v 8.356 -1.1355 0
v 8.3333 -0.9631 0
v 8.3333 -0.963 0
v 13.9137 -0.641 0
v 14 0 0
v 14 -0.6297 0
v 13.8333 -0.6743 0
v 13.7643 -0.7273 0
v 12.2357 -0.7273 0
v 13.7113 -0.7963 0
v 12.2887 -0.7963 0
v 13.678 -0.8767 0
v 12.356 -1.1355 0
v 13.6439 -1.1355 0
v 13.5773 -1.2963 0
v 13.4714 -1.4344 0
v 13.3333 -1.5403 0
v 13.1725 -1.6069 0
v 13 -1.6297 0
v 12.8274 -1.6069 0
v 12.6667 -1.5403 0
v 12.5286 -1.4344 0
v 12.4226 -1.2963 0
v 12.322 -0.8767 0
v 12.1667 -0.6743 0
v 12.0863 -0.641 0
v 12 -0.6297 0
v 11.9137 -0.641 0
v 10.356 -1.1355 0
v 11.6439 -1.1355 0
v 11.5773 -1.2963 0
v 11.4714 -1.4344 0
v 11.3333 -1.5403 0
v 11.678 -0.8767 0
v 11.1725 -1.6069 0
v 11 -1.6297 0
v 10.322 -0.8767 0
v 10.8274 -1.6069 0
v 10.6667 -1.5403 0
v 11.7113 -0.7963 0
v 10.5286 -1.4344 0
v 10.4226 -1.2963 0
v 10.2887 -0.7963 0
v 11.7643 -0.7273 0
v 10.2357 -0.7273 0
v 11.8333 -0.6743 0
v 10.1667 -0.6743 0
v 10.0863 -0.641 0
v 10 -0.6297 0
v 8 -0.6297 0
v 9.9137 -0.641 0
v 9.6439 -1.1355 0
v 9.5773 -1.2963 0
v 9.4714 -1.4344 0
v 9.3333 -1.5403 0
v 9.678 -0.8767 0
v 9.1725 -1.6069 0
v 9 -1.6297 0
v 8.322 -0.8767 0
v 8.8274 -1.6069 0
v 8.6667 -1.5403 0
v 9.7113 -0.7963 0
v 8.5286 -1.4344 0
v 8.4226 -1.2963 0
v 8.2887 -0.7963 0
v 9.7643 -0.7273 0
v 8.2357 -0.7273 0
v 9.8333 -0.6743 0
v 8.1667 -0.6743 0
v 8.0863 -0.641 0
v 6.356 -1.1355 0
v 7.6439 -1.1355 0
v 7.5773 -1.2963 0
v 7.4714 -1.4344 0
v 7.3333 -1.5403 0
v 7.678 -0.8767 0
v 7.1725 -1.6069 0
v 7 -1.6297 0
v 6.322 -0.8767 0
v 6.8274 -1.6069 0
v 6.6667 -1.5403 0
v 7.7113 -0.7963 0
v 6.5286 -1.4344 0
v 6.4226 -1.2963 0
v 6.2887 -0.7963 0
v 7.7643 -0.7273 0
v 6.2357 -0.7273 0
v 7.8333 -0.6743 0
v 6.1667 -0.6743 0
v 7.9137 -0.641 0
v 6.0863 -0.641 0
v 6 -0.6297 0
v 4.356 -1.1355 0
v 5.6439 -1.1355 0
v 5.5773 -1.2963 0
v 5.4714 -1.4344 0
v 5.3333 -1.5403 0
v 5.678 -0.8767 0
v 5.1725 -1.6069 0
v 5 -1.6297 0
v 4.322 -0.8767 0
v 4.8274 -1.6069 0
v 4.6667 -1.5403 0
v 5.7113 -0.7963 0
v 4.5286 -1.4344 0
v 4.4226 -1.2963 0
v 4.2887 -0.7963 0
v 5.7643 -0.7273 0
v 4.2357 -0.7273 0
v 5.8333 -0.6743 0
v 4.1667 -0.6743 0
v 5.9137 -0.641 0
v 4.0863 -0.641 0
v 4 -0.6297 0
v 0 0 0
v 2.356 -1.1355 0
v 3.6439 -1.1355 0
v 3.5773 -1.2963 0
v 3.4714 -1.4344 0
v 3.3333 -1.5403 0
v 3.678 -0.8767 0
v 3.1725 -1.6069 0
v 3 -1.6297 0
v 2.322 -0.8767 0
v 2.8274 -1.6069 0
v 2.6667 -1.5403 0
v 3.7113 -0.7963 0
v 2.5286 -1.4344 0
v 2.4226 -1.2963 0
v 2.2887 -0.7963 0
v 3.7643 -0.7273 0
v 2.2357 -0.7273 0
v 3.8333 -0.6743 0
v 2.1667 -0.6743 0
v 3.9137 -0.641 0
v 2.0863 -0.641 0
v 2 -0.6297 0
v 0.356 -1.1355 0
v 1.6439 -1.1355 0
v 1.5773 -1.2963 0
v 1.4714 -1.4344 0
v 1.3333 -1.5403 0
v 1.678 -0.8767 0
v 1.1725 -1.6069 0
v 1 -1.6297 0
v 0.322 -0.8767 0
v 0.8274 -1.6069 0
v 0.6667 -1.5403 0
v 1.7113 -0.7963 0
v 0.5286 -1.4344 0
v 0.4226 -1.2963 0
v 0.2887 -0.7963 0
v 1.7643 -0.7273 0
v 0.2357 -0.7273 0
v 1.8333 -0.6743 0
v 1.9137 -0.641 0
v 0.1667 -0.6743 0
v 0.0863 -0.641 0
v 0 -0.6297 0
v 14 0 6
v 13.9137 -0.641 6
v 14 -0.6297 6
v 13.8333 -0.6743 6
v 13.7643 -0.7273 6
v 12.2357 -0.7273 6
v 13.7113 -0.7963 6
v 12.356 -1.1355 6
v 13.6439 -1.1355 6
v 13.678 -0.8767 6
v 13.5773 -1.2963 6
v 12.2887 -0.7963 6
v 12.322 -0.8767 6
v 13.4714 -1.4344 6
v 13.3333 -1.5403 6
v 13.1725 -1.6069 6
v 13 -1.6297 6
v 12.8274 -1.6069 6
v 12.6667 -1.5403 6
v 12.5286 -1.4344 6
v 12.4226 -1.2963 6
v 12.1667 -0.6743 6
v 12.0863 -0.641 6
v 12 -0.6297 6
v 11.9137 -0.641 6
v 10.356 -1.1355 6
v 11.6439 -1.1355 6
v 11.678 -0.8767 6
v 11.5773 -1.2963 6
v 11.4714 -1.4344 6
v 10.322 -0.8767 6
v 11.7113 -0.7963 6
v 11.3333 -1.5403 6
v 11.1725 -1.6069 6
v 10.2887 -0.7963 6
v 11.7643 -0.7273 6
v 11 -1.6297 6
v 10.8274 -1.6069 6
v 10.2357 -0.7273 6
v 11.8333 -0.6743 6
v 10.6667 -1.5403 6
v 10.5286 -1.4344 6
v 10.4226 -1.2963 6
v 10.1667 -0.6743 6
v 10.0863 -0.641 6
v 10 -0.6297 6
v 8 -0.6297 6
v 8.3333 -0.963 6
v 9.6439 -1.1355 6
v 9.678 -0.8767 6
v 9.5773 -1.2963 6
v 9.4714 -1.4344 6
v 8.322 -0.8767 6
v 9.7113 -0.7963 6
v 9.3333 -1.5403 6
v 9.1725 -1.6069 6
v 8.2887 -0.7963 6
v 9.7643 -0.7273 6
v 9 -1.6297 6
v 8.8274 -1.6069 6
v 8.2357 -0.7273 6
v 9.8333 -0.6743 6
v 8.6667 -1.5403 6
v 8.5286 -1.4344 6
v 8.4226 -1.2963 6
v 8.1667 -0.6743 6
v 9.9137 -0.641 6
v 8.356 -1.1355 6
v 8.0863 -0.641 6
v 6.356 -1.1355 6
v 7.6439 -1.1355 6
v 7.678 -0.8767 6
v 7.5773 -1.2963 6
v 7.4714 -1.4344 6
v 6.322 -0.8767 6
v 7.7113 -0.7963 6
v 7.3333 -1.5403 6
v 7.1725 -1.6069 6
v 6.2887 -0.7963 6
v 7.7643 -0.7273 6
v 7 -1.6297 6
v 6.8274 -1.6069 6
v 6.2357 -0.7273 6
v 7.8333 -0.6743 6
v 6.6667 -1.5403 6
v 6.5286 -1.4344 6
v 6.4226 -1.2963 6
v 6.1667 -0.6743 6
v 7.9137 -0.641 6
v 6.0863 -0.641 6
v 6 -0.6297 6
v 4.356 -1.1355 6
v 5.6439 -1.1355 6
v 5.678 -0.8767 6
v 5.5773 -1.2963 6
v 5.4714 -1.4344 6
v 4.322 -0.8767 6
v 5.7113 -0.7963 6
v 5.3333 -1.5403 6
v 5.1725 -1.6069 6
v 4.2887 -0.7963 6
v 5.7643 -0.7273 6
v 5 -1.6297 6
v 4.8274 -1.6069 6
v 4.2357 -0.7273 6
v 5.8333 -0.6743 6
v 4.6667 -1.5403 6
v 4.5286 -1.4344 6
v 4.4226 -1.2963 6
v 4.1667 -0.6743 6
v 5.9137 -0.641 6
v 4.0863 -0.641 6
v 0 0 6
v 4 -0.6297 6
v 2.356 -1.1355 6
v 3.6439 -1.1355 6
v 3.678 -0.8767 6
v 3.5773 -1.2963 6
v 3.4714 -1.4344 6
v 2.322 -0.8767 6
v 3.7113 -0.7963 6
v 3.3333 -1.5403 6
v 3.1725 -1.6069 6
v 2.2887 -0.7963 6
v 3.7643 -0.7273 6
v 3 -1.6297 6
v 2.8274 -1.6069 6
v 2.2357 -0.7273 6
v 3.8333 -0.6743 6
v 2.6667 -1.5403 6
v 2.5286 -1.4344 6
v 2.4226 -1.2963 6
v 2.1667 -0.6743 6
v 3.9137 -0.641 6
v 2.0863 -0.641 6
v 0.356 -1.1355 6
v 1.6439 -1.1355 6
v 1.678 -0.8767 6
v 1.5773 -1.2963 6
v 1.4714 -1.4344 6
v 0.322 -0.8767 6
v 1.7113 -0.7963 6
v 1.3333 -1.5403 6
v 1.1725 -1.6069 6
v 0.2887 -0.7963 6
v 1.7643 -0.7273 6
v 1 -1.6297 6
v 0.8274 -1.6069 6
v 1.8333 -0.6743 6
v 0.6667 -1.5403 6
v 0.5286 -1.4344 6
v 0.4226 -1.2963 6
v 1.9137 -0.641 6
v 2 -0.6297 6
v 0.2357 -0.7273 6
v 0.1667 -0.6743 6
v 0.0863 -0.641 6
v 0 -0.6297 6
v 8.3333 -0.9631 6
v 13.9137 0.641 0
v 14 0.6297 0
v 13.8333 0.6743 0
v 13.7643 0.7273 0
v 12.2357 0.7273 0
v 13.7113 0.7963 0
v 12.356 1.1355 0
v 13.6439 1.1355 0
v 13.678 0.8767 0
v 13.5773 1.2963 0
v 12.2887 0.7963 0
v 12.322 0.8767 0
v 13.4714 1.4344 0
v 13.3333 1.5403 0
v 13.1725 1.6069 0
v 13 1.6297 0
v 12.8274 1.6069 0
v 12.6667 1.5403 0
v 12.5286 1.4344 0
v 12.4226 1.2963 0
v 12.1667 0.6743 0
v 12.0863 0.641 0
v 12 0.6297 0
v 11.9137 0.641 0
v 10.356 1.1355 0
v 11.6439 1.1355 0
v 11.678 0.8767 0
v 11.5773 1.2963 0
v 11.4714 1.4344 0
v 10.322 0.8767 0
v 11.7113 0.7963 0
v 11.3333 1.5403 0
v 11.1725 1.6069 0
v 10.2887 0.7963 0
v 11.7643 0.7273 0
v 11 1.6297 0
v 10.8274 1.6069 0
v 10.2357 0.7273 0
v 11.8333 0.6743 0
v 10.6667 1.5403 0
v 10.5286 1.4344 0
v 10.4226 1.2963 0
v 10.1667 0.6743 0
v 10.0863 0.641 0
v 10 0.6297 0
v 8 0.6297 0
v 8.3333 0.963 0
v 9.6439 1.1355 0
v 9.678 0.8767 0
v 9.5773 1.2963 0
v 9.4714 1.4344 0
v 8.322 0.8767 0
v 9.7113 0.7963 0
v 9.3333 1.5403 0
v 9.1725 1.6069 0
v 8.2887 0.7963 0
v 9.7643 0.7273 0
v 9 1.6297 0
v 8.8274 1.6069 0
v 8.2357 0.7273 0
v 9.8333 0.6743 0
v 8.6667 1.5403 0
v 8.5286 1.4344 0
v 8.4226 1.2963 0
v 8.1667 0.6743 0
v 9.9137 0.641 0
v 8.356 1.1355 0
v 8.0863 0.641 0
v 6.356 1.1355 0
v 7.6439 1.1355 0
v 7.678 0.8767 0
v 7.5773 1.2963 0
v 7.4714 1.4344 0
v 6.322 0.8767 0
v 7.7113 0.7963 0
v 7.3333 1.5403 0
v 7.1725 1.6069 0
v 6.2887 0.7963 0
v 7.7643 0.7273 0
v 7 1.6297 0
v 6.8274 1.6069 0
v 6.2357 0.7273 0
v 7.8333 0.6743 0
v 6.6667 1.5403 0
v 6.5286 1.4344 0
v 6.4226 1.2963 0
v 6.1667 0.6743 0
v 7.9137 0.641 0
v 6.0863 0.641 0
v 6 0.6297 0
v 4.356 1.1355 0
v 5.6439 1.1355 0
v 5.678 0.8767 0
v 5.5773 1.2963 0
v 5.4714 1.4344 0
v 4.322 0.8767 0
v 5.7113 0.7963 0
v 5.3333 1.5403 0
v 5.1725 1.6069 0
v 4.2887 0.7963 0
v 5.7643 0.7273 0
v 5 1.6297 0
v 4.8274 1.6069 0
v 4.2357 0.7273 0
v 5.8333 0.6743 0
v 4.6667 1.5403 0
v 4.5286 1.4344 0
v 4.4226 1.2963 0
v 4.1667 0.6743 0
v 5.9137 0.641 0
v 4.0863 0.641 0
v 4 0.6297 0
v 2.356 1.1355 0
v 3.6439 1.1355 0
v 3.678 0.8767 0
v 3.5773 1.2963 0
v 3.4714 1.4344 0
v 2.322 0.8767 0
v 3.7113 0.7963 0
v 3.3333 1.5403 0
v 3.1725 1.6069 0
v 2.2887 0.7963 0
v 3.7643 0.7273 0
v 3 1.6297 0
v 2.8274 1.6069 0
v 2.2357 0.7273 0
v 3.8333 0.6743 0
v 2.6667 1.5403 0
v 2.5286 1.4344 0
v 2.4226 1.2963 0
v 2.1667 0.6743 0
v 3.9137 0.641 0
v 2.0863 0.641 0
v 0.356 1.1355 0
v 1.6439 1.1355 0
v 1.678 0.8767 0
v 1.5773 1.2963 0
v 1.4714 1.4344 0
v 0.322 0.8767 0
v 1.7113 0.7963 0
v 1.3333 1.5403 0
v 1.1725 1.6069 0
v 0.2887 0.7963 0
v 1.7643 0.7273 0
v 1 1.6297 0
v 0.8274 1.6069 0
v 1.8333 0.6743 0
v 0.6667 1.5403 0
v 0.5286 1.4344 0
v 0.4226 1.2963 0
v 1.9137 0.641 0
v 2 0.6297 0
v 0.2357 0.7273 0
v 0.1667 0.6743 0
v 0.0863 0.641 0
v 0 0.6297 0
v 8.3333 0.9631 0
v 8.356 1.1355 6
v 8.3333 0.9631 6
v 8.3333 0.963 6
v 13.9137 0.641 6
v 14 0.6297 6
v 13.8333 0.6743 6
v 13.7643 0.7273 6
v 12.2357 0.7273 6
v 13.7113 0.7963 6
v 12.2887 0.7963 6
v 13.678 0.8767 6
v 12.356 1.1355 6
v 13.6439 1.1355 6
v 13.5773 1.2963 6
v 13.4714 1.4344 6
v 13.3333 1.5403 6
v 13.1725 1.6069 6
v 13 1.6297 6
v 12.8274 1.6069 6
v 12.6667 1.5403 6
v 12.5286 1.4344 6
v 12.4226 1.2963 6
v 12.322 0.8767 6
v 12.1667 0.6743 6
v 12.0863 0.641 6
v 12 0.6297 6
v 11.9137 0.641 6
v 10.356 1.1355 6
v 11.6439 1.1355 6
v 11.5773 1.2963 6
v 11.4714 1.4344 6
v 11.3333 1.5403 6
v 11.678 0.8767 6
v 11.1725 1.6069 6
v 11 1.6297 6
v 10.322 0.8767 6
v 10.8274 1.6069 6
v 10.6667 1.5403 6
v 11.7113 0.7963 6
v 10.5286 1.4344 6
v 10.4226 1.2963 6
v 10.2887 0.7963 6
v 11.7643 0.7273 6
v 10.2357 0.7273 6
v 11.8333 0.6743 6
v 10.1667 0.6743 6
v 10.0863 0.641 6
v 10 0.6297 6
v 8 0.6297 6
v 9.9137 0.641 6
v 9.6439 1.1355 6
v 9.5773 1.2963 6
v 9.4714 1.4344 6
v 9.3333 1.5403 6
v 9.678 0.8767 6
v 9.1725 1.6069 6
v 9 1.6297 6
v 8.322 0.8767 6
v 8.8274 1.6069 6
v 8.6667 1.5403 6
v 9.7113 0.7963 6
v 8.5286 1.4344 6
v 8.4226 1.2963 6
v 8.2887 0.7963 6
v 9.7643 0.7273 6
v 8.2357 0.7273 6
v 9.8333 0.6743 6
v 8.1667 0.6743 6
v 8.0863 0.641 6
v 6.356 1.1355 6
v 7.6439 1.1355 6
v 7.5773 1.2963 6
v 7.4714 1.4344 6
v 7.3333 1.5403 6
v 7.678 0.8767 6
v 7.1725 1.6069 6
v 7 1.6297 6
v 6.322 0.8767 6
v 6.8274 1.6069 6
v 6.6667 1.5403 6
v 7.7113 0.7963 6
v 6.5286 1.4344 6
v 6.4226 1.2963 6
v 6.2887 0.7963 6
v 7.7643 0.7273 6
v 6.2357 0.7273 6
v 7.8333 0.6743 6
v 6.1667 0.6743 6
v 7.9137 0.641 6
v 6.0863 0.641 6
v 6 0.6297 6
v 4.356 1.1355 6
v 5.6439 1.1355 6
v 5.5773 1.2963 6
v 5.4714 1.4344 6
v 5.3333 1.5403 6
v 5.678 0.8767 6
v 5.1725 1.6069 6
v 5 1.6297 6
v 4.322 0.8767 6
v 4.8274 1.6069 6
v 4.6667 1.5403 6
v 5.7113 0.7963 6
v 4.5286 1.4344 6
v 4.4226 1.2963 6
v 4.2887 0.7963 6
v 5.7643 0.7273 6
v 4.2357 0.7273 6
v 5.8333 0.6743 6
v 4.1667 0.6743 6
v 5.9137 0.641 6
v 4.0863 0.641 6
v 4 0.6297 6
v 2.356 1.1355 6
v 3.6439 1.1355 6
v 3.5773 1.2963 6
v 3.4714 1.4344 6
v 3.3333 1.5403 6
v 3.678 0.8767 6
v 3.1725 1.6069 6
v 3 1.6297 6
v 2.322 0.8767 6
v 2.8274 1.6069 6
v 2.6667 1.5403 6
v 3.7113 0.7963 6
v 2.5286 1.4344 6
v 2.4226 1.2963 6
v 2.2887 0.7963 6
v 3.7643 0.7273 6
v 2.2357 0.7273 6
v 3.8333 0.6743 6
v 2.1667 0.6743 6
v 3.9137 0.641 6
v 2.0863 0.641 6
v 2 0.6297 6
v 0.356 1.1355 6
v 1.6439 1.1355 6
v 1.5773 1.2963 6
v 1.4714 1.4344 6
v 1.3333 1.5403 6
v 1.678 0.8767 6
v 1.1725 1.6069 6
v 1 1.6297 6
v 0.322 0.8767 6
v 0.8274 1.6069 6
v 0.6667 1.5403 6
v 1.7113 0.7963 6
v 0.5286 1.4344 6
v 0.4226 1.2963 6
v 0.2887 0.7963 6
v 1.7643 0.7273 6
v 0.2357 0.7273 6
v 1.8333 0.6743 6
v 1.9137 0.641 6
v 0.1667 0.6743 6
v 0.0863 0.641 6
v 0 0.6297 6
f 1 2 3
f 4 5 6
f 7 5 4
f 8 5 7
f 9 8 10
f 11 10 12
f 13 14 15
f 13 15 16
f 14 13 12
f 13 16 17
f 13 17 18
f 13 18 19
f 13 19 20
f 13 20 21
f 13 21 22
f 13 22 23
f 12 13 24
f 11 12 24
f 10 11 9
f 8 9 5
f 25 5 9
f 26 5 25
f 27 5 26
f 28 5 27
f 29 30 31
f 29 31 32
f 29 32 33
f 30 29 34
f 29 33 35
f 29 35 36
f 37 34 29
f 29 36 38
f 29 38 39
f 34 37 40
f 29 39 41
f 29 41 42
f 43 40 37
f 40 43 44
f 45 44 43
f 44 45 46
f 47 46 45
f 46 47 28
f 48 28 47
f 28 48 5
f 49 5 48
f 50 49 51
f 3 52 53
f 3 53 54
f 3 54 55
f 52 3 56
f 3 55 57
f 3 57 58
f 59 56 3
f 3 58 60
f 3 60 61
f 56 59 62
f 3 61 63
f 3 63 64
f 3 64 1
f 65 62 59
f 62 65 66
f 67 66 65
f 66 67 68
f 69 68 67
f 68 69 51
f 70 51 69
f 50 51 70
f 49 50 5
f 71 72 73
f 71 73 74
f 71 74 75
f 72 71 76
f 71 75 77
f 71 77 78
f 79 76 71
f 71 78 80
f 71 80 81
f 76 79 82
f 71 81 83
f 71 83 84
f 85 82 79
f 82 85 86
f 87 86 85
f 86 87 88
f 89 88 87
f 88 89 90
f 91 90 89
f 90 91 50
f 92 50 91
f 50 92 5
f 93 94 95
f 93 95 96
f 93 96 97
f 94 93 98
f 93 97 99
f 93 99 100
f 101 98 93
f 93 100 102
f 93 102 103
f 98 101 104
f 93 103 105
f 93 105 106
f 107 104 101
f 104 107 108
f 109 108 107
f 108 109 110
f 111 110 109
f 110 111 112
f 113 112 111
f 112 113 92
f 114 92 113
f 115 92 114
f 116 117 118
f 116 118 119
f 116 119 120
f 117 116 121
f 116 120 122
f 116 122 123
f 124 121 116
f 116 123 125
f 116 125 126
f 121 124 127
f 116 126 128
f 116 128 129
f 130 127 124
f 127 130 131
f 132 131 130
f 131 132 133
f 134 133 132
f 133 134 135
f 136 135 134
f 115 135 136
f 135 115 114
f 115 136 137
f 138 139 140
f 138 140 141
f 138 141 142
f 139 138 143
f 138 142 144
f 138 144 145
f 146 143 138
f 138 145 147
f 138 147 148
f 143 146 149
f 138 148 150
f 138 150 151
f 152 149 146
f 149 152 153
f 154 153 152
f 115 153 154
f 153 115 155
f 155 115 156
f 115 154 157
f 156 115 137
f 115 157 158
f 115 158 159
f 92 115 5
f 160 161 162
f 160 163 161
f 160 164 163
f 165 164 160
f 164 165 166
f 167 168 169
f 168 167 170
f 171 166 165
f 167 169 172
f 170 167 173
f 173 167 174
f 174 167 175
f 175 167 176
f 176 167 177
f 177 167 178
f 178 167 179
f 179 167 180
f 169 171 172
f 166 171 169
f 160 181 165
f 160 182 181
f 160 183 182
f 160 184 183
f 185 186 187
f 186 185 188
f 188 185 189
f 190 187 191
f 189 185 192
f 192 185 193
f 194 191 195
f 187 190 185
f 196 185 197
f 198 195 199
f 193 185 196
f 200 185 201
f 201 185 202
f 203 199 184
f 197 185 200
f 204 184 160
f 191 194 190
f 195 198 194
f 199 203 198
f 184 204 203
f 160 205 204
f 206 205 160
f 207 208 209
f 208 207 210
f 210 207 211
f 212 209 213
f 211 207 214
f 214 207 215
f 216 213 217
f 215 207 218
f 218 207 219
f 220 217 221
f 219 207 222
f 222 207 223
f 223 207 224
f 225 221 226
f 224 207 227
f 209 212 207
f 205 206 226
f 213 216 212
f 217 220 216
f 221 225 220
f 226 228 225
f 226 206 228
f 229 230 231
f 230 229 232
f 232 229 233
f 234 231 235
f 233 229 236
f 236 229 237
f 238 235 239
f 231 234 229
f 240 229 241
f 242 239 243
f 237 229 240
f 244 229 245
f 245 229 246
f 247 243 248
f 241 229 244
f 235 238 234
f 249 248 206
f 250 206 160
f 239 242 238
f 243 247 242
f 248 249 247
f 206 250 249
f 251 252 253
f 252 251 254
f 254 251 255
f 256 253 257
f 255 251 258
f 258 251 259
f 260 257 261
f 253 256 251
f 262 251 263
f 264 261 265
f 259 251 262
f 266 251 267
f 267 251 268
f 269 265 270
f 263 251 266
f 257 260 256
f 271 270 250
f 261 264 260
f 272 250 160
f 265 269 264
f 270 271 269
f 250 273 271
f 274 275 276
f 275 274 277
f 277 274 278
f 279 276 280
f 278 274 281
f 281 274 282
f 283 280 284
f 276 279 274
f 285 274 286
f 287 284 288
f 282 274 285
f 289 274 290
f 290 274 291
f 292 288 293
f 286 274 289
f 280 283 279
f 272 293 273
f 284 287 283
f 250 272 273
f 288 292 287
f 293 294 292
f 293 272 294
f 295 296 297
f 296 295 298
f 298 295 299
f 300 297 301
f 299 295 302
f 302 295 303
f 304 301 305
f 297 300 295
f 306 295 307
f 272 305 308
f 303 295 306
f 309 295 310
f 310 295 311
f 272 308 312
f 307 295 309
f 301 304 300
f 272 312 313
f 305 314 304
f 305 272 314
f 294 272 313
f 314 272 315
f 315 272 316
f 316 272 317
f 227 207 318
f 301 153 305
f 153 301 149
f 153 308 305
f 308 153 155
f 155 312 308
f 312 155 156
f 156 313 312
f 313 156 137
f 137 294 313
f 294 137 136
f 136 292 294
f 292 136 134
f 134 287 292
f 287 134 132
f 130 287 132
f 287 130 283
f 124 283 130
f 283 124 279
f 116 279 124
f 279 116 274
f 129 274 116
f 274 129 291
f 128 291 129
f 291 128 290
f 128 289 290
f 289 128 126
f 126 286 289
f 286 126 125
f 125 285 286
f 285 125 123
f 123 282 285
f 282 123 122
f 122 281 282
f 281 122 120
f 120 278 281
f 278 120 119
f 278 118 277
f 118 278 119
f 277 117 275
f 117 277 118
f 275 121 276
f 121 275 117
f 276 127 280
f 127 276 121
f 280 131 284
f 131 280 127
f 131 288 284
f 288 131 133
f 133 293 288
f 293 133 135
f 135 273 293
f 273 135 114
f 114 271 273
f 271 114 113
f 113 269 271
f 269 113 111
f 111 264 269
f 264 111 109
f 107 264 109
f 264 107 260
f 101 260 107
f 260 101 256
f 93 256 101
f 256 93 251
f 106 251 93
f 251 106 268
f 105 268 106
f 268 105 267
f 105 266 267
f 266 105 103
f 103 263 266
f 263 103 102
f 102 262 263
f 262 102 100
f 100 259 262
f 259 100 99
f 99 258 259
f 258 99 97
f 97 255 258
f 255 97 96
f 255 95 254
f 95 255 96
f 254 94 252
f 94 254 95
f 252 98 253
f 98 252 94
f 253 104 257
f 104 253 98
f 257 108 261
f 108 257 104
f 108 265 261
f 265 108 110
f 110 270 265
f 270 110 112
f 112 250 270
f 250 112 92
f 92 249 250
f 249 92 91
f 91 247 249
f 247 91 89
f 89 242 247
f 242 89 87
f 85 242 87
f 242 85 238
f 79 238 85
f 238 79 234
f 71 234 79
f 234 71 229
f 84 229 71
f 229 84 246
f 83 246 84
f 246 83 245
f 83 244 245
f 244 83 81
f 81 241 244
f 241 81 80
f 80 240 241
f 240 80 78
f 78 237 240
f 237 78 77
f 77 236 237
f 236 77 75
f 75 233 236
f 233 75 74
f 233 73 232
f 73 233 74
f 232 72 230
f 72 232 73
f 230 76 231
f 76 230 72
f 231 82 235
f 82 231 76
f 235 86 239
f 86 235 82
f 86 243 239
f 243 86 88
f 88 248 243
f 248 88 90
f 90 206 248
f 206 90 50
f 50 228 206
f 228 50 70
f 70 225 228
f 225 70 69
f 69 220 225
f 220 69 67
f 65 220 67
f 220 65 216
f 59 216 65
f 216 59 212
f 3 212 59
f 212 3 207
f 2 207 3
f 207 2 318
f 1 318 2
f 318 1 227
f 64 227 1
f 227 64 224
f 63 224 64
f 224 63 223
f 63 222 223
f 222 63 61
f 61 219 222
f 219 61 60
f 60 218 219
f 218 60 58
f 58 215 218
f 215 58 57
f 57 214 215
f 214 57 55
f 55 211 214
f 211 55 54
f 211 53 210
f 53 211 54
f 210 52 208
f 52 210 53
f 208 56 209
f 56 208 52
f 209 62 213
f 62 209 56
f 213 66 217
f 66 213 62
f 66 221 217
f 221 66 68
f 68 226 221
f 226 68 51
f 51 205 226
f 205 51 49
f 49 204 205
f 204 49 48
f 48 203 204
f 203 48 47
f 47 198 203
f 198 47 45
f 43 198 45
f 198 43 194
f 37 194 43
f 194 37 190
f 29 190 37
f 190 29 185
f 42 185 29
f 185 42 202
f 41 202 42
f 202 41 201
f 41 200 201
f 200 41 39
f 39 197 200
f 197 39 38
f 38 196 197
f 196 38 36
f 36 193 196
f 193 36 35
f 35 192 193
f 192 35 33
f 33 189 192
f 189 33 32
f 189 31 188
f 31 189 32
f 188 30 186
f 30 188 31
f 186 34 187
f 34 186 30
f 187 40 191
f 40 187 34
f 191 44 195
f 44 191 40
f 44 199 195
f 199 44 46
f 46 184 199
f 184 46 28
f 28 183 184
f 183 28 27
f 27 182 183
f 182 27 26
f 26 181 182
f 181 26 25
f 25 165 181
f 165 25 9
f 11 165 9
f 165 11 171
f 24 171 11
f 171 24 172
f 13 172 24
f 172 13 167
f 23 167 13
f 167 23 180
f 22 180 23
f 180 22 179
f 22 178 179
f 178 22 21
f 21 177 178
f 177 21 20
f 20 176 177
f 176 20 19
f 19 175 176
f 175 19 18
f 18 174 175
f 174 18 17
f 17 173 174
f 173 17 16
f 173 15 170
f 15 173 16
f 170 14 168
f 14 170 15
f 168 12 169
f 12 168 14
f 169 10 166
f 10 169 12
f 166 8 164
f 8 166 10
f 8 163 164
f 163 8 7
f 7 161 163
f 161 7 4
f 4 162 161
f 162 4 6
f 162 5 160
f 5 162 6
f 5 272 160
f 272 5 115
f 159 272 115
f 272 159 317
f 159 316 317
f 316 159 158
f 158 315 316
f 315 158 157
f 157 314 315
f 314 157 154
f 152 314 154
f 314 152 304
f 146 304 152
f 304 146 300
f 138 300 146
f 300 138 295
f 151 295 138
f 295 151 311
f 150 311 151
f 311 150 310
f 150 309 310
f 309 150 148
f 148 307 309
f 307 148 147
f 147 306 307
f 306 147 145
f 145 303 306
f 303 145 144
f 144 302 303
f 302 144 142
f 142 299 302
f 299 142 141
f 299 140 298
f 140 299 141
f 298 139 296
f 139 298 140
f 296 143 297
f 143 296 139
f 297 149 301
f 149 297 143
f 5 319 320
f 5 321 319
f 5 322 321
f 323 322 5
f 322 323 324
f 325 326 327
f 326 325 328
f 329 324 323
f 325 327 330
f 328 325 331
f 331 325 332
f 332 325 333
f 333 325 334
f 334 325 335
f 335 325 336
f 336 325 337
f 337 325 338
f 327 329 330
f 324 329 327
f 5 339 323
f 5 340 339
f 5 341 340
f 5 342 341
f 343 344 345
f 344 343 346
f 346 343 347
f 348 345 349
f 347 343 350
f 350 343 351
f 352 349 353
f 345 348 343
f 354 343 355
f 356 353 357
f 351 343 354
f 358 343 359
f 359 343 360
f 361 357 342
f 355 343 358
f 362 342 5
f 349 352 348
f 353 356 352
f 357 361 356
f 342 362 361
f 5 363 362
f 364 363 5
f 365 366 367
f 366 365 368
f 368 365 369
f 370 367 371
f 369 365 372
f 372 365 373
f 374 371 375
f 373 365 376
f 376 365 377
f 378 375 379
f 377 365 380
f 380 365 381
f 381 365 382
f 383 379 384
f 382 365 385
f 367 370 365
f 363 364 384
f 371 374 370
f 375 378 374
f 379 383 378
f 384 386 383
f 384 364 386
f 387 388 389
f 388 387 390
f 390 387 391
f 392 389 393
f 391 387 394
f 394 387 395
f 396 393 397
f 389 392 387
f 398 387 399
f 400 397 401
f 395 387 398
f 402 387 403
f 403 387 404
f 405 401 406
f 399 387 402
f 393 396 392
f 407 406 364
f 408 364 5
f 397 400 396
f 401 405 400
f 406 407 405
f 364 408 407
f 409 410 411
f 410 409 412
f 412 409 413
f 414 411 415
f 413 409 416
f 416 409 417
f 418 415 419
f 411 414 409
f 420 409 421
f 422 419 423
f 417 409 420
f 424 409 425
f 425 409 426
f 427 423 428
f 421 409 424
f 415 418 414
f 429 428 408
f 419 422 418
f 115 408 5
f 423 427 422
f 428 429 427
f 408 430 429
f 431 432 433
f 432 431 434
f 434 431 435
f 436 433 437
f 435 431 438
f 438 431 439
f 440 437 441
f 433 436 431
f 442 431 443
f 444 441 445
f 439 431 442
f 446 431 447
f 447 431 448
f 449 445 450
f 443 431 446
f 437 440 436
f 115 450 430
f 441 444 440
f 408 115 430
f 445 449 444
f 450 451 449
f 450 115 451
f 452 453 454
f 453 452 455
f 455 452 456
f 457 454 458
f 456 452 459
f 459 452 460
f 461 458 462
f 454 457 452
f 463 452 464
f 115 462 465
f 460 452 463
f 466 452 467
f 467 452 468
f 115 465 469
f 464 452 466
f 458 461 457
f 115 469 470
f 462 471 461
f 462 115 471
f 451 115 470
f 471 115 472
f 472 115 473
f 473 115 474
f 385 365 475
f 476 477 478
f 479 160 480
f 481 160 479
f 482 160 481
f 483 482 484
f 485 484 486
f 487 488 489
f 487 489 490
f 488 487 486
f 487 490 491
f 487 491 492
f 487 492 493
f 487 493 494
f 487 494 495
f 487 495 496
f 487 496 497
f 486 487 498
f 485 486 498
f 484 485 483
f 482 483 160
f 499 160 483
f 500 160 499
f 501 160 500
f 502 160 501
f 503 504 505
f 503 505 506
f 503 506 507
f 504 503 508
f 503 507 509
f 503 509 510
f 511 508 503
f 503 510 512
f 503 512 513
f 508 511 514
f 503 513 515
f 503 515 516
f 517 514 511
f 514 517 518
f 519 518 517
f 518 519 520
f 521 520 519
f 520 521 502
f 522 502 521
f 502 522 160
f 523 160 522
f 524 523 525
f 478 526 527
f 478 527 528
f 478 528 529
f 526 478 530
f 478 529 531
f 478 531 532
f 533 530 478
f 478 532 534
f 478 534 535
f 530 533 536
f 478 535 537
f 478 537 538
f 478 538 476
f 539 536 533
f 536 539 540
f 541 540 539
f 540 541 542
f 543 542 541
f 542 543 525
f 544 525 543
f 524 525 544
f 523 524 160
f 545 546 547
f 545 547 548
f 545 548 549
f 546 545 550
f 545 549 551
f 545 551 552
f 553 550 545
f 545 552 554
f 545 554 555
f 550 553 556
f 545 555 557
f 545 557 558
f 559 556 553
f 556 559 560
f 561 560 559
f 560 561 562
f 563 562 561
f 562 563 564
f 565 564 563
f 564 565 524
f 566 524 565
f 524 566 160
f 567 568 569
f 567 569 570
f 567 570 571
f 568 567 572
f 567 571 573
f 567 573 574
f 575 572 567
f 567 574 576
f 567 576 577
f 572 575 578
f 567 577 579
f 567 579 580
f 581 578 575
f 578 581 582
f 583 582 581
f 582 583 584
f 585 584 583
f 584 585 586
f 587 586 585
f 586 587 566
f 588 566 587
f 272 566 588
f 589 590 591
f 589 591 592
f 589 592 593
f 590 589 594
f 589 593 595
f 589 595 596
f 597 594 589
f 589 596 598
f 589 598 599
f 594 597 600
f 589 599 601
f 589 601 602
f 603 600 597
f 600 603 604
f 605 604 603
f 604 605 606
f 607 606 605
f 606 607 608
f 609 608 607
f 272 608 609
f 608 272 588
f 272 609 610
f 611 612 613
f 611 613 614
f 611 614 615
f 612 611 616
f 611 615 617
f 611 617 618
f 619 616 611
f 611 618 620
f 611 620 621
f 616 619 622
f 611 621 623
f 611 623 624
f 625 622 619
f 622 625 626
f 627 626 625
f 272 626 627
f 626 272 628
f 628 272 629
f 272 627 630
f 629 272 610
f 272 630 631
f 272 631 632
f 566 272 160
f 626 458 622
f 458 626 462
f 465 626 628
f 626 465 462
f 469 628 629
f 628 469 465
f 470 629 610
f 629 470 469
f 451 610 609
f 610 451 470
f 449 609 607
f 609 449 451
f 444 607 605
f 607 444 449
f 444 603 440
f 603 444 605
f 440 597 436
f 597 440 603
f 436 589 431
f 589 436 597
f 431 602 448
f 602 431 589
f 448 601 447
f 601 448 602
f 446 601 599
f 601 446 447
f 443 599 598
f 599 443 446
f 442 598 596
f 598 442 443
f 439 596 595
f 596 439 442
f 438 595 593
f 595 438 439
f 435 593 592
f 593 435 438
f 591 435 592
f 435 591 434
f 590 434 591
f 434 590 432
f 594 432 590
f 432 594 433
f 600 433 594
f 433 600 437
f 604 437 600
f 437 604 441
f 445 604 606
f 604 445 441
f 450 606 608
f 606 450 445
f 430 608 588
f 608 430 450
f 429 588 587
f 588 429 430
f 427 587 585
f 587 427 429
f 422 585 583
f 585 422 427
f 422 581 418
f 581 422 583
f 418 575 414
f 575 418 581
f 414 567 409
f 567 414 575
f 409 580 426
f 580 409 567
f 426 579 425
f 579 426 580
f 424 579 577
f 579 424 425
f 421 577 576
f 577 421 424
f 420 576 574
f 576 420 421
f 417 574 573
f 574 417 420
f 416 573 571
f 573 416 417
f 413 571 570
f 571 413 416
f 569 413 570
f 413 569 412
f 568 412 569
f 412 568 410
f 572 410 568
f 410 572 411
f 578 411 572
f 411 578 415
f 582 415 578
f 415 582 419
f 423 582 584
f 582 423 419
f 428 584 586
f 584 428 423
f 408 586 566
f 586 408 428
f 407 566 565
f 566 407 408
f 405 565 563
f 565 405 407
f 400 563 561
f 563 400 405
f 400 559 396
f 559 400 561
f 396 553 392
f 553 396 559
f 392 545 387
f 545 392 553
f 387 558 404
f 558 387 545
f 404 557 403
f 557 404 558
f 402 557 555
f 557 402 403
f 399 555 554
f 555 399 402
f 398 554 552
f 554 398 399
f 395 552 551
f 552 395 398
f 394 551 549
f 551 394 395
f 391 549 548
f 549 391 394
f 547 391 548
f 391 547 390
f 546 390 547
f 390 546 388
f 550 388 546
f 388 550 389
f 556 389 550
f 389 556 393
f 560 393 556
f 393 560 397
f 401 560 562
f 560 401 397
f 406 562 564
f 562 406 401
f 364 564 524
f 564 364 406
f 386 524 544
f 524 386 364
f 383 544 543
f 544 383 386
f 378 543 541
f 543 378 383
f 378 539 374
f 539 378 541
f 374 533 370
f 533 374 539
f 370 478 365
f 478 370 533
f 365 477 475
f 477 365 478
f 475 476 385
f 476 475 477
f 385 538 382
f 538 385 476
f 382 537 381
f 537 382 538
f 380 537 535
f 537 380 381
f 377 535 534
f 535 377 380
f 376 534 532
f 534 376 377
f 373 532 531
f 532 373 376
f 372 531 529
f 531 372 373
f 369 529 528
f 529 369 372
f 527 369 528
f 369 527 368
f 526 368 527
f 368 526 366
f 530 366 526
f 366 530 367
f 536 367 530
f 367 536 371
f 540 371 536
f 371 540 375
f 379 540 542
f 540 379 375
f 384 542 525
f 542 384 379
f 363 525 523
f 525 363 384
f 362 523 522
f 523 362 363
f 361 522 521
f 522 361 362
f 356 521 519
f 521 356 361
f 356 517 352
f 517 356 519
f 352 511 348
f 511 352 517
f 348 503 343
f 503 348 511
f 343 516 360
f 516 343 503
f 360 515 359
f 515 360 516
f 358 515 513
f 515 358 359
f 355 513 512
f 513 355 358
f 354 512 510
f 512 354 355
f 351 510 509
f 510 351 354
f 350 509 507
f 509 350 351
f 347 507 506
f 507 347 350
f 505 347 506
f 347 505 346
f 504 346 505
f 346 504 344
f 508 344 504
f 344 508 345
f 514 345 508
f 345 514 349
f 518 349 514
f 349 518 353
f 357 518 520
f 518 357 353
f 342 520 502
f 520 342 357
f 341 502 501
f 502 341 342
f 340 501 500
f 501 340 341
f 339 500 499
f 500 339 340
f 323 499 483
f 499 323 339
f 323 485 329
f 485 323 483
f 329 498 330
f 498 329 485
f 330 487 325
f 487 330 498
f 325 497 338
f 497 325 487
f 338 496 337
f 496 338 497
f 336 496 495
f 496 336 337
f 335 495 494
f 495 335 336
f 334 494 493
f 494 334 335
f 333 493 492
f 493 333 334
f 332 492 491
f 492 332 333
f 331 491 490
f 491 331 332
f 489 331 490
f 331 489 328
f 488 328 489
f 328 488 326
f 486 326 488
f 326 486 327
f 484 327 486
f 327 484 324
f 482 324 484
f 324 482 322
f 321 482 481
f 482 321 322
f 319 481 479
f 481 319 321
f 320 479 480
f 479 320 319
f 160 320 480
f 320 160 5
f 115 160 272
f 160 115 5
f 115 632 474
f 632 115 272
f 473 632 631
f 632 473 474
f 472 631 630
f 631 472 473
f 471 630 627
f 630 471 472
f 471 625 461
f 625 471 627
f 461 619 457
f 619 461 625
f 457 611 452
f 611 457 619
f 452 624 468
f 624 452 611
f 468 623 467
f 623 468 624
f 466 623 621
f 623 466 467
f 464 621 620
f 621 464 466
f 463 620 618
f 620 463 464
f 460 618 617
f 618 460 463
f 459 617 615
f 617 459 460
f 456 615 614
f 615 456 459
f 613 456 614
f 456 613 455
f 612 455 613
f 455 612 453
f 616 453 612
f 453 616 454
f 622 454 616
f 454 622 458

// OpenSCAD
$fn=24;


GT2_profile(l=14);
mirror([0,1,0])
	GT2_profile(l=14);


module GT2_profile(l = 10, w=6){
 translate([2/6,-.963,0]) 
  linear_extrude(height = w)
	difference(){
		union(){
			translate([-2/6,0,0])
			   square([l,.963]);

			for (i = [0:l/2-1]){
				translate([2/3 + i*2,0,0])
					circle(r=2/3);
			}
		}

		for (i = [0:l/2]){
			translate([-2/6 + i*2,0,0])
				circle(r=2/6);
		}
	}
}	
